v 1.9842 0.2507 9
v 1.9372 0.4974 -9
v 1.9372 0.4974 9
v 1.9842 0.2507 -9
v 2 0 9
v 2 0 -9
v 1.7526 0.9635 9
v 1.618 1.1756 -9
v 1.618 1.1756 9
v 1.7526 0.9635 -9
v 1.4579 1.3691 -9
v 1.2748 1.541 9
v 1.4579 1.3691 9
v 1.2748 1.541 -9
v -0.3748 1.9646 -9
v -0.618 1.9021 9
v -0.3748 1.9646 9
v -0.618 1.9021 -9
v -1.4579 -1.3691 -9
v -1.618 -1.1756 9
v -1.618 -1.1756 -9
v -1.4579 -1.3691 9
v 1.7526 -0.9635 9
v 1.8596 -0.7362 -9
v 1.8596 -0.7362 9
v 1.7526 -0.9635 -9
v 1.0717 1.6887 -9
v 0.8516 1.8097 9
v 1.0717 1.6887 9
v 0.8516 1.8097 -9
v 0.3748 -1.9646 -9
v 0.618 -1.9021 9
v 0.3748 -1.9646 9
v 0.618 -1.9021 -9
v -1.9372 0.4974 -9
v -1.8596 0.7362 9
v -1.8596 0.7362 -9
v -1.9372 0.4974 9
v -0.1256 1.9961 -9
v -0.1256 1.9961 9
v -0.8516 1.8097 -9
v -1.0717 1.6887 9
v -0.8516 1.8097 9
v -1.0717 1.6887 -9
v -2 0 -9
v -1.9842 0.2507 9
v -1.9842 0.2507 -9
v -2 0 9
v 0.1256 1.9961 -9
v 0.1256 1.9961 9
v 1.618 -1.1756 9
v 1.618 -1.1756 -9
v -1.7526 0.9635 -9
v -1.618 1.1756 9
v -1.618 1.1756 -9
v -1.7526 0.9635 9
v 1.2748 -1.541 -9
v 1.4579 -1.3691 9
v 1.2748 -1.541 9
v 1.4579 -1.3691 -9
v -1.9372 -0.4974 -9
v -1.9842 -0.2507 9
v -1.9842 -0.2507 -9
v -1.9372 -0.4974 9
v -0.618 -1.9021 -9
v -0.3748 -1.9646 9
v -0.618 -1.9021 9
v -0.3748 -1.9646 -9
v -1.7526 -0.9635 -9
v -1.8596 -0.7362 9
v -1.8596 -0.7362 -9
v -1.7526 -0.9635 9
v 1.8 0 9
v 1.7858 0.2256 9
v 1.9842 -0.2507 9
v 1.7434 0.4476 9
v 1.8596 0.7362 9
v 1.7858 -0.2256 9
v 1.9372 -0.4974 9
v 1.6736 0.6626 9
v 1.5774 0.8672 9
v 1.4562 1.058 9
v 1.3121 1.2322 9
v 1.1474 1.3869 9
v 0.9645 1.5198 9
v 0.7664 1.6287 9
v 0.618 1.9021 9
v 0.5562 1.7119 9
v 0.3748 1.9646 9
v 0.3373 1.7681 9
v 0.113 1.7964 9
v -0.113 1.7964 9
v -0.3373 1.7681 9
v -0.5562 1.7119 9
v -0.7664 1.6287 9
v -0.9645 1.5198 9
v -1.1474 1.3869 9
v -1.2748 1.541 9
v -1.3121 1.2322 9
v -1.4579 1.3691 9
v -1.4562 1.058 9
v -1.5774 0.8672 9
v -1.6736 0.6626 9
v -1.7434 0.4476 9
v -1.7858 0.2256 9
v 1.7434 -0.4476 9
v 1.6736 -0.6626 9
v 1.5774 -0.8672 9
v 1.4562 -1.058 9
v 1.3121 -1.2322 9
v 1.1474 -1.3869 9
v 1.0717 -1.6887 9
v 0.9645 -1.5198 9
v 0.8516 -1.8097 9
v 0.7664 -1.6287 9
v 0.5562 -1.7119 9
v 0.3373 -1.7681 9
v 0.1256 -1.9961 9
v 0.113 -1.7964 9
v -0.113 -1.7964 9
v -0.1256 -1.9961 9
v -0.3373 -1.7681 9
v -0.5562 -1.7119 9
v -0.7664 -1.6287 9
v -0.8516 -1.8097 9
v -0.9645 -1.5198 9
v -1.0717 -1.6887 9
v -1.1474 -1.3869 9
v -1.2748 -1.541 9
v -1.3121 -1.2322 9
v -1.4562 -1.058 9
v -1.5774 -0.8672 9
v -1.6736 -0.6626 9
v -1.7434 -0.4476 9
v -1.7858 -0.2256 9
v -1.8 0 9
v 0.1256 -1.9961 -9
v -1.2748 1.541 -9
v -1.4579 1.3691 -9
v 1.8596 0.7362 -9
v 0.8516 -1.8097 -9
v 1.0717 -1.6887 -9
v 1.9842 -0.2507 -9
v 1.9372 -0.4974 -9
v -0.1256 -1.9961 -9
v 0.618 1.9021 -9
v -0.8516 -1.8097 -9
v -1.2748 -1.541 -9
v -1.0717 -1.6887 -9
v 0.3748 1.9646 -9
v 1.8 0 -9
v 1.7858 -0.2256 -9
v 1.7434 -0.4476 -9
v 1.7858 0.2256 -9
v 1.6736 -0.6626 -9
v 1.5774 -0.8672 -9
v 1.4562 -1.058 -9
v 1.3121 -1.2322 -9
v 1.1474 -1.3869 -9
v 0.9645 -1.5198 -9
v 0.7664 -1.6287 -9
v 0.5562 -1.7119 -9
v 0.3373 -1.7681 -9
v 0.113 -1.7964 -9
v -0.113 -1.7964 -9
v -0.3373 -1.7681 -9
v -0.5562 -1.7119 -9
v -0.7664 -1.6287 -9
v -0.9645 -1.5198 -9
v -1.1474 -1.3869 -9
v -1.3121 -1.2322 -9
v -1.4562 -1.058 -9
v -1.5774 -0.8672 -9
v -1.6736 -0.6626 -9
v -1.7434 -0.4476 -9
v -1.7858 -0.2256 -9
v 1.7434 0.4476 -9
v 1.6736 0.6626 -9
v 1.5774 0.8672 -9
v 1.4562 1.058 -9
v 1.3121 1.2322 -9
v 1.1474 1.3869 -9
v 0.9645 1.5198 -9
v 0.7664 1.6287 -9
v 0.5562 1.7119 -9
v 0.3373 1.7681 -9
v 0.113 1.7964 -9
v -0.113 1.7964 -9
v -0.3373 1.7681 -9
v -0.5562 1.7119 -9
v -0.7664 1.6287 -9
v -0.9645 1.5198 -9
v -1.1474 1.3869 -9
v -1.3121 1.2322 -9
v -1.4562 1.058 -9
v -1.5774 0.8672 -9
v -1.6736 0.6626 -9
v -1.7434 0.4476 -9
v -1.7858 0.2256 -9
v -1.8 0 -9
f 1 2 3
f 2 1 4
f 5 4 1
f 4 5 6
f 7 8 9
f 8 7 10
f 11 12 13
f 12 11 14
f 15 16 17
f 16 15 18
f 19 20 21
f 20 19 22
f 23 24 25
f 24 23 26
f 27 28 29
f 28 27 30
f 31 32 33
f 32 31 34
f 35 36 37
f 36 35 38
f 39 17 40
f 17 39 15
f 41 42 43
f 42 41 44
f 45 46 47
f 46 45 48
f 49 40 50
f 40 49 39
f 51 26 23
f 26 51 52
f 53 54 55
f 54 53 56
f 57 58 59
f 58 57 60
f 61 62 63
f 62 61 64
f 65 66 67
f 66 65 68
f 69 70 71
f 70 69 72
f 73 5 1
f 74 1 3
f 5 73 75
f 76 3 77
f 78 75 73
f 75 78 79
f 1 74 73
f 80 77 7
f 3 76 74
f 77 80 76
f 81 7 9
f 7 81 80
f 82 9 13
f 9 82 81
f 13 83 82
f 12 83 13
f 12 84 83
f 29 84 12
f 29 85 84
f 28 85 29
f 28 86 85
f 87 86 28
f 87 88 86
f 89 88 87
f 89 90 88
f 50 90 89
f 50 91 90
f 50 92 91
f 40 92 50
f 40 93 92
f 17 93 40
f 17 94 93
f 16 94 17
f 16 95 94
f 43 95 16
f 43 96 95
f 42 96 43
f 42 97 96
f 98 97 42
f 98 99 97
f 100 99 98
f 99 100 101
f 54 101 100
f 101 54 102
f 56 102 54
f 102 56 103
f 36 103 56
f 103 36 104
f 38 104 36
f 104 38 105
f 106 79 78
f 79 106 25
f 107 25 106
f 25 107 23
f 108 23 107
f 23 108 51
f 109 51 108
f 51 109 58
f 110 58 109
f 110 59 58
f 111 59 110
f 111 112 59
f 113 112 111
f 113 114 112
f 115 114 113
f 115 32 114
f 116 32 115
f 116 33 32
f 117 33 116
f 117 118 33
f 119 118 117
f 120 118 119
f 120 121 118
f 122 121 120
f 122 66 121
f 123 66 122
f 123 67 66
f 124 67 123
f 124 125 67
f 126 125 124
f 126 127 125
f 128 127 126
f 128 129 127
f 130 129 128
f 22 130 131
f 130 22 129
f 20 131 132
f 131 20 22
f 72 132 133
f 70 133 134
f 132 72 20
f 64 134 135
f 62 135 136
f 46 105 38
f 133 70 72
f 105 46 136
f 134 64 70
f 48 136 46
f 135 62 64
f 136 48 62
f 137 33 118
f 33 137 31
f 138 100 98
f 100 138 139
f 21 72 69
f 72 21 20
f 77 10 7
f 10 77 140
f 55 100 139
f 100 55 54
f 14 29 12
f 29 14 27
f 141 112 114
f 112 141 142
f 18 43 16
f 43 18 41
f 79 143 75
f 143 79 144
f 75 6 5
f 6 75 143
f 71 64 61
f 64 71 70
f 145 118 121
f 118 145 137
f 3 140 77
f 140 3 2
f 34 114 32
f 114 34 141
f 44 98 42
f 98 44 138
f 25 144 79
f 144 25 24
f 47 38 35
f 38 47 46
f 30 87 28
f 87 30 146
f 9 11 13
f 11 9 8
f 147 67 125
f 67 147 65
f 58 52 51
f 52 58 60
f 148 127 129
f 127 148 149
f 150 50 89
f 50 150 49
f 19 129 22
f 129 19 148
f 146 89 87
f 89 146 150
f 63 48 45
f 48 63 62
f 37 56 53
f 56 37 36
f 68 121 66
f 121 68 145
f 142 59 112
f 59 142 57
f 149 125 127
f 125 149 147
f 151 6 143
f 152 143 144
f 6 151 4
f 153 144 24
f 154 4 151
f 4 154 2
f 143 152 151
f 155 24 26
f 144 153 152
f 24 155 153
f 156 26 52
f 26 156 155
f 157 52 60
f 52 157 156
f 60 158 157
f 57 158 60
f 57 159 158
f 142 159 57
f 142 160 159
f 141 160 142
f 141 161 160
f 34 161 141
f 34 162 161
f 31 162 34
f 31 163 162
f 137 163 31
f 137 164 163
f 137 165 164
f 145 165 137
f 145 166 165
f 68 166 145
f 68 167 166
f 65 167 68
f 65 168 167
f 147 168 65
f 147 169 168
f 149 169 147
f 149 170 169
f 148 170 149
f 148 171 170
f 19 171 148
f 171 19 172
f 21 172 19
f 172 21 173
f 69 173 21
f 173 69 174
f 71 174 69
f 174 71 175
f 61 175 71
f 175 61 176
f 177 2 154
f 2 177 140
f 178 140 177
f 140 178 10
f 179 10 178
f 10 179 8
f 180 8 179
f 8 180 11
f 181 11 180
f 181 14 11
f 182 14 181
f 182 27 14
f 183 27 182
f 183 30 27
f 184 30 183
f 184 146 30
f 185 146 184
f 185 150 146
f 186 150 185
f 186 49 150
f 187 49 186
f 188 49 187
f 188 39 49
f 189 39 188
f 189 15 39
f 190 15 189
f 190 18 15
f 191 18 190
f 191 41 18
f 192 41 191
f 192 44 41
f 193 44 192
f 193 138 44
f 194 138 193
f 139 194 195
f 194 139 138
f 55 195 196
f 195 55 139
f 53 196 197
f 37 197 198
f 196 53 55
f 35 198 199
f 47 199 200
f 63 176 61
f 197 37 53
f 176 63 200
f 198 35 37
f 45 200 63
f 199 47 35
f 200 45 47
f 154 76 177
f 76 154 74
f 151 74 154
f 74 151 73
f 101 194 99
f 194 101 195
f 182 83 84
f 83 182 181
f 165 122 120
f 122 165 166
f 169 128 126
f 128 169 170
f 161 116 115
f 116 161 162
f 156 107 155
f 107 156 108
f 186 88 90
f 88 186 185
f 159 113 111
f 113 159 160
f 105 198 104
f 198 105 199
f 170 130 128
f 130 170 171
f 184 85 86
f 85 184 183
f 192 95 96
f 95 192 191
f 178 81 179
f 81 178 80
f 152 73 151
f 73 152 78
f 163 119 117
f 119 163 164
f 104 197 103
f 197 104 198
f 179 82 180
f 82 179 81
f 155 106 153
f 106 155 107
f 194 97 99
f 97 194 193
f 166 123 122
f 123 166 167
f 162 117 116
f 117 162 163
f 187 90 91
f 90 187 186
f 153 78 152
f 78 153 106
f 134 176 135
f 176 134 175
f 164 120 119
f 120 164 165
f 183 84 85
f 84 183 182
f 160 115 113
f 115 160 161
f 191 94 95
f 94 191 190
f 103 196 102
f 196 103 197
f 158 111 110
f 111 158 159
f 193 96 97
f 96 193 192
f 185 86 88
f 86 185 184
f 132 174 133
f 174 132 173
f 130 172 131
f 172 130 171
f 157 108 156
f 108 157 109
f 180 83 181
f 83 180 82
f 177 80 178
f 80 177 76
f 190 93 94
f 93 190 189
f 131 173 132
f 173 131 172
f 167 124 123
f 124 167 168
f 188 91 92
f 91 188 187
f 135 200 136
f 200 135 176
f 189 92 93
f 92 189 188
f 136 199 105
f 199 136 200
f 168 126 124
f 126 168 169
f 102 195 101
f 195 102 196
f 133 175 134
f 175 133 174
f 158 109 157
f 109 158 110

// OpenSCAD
$fn = 50;


difference() {
	union() {
		translate(v = [0, 0, -9.0000000000]) {
			cylinder(h = 18, r = 2.0000000000);
		}
	}
	union() {
		#translate(v = [0, 0, -100.0000000000]) {
			cylinder(h = 200, r = 1.8000000000);
		}
	}
}
